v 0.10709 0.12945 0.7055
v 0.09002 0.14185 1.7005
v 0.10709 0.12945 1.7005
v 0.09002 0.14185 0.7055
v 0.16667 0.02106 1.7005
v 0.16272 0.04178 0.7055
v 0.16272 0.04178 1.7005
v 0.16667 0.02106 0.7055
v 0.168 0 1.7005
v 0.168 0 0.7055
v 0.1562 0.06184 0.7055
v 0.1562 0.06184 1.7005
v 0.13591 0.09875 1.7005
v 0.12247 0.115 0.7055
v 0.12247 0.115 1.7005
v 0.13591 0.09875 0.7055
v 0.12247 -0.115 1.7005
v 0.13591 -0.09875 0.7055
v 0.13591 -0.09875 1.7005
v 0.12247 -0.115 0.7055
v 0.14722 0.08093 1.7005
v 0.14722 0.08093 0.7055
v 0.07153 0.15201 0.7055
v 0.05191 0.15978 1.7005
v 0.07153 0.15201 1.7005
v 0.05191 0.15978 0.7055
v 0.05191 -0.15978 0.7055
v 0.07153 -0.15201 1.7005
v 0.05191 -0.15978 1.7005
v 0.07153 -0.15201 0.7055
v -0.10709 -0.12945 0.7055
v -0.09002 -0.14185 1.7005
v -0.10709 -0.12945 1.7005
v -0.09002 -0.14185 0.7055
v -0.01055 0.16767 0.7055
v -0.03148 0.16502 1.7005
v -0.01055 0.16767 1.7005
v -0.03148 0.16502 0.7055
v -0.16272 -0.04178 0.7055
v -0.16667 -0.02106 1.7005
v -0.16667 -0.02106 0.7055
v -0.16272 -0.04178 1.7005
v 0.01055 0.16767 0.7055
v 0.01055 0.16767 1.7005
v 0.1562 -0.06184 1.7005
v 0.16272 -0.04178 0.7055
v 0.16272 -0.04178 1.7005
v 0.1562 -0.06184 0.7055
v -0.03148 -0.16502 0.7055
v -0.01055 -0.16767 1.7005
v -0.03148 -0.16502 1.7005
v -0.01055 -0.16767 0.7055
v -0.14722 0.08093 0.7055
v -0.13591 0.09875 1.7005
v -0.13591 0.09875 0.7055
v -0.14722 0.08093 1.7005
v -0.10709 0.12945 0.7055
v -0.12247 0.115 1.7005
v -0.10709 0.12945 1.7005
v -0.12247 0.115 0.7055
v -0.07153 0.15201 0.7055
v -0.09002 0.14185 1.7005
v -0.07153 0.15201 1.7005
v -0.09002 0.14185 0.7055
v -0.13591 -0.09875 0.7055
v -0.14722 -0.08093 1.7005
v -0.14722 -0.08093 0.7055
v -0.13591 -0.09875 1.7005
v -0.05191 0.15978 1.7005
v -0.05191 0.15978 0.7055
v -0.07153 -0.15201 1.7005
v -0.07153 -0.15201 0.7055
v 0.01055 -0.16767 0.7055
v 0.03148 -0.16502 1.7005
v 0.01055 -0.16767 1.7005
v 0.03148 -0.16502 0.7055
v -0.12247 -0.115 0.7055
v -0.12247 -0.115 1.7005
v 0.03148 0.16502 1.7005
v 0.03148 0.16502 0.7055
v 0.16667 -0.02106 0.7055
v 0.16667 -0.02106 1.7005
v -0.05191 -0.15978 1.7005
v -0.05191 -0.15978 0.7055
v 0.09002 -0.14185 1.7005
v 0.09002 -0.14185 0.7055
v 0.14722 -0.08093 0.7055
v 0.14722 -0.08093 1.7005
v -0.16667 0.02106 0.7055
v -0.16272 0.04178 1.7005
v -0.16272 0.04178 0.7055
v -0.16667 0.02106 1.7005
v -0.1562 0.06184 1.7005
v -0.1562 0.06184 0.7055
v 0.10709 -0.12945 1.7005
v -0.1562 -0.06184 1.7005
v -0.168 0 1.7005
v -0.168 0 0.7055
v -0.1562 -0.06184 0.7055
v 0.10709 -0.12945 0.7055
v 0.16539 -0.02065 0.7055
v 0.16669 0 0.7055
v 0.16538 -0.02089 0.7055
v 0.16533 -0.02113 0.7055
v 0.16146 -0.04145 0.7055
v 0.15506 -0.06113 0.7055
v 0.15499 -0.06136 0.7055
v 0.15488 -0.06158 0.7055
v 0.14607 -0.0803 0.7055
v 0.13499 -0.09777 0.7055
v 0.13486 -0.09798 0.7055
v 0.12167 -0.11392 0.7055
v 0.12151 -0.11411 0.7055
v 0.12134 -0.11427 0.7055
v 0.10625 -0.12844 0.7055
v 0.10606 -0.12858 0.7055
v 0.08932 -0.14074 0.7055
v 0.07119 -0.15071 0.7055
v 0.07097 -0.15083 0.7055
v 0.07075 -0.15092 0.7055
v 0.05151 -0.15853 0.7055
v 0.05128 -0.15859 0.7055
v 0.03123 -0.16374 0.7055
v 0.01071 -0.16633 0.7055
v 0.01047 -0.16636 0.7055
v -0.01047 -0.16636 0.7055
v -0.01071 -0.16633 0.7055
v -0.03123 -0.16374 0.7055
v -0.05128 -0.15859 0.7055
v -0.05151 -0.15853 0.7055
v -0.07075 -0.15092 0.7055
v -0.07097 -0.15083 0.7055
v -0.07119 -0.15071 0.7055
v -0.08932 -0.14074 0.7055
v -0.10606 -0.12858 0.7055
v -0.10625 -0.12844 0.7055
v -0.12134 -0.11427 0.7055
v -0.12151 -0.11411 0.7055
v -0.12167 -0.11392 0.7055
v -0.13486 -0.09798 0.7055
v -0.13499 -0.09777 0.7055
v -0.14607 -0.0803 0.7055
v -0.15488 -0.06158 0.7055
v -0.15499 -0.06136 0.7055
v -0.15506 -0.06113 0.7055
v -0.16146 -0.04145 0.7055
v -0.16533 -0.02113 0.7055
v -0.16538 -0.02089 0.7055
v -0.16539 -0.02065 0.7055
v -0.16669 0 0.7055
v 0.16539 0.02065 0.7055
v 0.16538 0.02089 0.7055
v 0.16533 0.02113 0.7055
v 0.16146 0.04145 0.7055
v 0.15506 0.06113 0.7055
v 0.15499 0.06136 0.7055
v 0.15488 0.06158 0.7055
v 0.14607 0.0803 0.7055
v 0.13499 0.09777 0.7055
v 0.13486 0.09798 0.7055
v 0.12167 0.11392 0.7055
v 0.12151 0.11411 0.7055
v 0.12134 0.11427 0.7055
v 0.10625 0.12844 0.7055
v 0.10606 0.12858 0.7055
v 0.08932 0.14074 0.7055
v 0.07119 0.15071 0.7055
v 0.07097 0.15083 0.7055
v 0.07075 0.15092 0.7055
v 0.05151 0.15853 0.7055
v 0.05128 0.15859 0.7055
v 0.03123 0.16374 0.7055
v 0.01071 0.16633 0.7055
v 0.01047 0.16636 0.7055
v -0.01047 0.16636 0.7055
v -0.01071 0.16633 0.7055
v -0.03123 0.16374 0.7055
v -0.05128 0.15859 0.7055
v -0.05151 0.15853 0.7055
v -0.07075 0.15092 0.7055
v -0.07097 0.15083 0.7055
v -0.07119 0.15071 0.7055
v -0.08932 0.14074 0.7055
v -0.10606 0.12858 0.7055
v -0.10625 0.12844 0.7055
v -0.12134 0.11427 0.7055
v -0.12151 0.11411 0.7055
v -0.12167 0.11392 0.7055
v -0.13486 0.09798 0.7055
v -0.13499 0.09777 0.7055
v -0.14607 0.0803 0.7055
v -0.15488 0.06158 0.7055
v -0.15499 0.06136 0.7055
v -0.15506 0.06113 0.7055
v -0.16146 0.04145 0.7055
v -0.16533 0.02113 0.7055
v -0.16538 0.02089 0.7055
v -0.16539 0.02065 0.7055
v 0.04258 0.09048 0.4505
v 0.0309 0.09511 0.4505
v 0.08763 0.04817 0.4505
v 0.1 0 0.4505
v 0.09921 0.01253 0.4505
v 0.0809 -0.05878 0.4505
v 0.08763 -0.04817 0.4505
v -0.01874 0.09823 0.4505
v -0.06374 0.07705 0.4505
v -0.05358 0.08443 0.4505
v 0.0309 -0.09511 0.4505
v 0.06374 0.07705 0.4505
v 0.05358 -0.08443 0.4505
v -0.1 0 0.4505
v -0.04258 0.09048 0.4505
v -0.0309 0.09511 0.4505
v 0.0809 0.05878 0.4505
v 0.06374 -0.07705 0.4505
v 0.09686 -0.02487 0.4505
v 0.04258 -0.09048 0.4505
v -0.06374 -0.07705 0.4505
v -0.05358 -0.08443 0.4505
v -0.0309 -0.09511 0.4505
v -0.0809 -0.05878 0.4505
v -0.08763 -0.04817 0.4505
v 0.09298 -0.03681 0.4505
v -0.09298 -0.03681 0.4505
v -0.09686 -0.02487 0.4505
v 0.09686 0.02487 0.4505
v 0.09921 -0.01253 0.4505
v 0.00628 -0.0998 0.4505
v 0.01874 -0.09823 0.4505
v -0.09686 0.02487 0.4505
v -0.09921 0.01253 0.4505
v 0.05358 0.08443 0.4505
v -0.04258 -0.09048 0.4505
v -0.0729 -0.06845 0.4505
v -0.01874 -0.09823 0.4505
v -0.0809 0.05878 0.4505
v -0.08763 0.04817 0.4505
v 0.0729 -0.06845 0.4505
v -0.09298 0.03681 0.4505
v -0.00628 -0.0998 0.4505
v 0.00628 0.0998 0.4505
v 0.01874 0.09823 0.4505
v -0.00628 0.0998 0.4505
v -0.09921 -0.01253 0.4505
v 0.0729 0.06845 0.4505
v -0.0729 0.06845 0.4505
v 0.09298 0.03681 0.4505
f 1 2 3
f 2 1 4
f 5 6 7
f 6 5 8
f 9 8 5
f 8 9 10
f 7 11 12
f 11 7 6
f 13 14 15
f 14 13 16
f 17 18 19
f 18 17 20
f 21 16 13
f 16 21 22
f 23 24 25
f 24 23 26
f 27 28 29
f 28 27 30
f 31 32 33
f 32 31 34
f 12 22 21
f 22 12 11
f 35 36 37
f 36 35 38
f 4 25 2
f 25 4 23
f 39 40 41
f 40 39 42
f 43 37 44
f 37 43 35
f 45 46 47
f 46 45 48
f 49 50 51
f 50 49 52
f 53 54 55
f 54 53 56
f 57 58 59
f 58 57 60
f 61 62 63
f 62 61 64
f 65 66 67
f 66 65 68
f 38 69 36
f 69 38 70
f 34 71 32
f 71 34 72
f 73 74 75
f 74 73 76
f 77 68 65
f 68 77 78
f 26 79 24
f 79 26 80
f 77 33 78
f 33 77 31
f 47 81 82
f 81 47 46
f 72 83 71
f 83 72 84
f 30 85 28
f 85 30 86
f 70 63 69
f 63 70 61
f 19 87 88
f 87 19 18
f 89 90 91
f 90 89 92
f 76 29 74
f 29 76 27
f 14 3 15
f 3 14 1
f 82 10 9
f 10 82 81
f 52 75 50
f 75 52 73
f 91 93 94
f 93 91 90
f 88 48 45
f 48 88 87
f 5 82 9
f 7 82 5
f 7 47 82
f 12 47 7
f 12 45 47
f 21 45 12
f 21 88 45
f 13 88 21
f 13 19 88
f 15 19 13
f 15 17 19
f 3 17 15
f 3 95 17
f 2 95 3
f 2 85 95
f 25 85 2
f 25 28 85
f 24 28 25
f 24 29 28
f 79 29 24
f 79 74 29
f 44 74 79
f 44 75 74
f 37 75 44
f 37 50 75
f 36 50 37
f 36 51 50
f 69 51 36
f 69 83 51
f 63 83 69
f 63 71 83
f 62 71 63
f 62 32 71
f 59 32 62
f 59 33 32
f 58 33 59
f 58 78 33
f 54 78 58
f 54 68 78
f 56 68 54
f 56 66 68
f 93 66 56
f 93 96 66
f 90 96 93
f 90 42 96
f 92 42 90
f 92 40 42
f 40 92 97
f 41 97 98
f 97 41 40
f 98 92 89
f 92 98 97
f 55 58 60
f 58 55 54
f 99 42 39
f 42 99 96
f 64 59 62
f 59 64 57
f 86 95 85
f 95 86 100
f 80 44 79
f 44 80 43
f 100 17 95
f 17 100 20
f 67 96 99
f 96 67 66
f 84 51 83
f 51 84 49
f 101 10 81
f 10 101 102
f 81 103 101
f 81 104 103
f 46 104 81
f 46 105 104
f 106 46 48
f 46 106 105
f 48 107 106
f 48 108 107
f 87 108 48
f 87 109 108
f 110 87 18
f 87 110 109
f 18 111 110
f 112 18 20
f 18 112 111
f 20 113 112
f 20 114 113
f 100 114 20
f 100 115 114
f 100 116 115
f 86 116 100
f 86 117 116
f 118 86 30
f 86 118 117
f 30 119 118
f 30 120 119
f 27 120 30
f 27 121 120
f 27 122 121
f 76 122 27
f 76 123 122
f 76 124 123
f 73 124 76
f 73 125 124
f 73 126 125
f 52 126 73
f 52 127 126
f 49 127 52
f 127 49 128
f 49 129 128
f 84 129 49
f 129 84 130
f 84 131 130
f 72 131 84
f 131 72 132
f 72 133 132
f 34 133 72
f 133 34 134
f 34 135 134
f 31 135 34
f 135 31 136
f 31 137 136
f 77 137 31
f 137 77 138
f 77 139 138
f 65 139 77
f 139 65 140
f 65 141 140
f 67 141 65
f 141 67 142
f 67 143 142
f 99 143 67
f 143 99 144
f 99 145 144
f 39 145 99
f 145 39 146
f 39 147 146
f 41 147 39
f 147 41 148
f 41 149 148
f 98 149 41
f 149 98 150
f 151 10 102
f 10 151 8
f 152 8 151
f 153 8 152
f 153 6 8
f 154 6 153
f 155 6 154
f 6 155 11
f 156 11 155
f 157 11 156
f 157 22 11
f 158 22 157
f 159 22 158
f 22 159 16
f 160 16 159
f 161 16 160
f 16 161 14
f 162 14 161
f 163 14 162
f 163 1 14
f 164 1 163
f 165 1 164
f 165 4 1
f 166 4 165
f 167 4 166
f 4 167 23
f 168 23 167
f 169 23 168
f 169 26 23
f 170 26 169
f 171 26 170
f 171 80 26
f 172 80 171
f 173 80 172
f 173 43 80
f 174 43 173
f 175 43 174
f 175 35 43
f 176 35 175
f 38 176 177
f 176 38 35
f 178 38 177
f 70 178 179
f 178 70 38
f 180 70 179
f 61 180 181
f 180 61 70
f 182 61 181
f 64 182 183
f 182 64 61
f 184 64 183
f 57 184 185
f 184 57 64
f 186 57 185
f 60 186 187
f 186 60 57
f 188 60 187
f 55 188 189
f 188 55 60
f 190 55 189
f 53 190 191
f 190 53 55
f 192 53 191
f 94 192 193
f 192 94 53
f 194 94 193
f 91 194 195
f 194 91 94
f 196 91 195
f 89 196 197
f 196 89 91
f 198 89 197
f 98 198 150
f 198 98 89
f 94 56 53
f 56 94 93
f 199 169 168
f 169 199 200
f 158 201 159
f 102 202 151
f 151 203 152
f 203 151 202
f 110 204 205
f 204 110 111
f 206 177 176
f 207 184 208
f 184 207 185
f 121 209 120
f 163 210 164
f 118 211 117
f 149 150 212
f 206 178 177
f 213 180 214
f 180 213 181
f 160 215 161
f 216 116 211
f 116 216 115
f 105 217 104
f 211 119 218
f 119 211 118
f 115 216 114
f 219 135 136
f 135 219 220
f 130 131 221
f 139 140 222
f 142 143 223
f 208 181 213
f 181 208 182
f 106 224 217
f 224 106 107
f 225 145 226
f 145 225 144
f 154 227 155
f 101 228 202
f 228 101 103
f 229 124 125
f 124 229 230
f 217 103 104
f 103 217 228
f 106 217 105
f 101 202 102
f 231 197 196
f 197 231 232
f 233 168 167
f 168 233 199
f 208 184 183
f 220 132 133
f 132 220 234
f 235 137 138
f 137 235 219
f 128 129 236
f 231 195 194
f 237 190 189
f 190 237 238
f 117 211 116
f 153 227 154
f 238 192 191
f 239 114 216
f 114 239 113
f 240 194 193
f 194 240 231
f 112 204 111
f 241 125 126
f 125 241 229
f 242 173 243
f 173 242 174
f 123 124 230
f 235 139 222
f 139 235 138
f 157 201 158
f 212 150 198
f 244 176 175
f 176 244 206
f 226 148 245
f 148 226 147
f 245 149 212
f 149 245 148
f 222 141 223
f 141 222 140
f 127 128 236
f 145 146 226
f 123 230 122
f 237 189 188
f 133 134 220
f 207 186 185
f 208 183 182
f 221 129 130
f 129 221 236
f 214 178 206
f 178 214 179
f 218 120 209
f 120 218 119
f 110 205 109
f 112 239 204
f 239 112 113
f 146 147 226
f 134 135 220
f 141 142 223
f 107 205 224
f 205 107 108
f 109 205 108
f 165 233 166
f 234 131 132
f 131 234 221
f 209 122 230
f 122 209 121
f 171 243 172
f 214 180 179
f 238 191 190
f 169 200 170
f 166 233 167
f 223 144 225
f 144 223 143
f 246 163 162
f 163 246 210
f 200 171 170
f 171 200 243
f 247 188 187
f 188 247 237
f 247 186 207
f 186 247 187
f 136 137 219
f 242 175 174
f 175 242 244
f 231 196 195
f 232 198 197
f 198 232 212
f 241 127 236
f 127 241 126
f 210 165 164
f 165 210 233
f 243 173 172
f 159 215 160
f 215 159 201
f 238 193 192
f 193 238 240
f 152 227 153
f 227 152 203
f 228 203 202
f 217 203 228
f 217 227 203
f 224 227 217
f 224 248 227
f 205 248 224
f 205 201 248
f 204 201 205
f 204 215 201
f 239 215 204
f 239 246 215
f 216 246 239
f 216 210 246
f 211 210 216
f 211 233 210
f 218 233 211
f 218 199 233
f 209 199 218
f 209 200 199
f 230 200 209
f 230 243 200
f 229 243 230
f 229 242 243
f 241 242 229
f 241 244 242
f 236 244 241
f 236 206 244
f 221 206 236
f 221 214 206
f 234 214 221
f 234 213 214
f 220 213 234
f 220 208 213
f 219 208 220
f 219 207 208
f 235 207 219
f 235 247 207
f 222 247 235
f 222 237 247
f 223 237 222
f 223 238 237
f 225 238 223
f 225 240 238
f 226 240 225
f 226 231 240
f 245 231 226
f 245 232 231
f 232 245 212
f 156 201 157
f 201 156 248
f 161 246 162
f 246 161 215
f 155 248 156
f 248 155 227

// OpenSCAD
$fn=50;

union() {
    // connects to benchy
    //color( [1, 0, 1, 0.5] )
    //cylinder( h=0.911, d=.140, center=true );
    
    // goes into rubber cylinder lid
    color( [1, 0, 1, 0.5] )
    translate( [0,0, 0.995/2 + 0.911/2 + 0.25] )
        cylinder( h=0.995, d=0.336, center=true );

    /*
    color( [1, 1, 0, 0.5] )
    // connects the two
    translate( [0,0, 0.911/2 + 0.25/2] )
        cylinder( h=0.26, d1=.140, d2=0.336, center=true );
    */
    
    // wider connector
    color( [1, 1, 0, 0.5] )
    // connects the two
    translate( [0,0, 0.911/2 + 0.25/2] )
        cylinder( h=0.26, d1=.2, d2=0.336, center=true );
    
}
